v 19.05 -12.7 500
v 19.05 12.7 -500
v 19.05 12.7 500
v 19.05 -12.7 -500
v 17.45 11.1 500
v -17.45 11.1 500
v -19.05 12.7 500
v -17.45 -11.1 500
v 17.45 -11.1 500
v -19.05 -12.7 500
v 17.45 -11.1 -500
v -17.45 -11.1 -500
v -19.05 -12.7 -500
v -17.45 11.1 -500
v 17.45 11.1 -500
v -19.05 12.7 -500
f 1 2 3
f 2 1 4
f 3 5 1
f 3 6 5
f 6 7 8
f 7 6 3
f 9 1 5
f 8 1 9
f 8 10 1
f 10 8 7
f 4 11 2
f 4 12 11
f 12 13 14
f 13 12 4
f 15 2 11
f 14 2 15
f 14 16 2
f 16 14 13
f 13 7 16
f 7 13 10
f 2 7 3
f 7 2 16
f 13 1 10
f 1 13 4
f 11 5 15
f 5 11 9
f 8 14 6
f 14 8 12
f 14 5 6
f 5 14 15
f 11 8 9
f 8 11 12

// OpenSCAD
// Aluminium rectangular box section: 38.1mm x 25.4mm x 1.6mm

outer_W   = 38.1;   // mm
outer_H   = 25.4;   // mm
wall_t    = 1.6;    // mm
length_L  = 1000;   // mm

eps = 0.01;         // small overlap to ensure robust boolean

module rectangular_tube(W, H, t, L) {
    inner_W = W - 2*t;
    inner_H = H - 2*t;

    assert(inner_W > 0 && inner_H > 0, "wall_t too large for given outer dimensions.");

    difference() {
        // Outer solid (tube body)
        cube([W, H, L], center=true);

        // Inner void (slightly longer so it fully cuts through)
        cube([inner_W, inner_H, L + 2*eps], center=true);
    }
}

rectangular_tube(outer_W, outer_H, wall_t, length_L);
